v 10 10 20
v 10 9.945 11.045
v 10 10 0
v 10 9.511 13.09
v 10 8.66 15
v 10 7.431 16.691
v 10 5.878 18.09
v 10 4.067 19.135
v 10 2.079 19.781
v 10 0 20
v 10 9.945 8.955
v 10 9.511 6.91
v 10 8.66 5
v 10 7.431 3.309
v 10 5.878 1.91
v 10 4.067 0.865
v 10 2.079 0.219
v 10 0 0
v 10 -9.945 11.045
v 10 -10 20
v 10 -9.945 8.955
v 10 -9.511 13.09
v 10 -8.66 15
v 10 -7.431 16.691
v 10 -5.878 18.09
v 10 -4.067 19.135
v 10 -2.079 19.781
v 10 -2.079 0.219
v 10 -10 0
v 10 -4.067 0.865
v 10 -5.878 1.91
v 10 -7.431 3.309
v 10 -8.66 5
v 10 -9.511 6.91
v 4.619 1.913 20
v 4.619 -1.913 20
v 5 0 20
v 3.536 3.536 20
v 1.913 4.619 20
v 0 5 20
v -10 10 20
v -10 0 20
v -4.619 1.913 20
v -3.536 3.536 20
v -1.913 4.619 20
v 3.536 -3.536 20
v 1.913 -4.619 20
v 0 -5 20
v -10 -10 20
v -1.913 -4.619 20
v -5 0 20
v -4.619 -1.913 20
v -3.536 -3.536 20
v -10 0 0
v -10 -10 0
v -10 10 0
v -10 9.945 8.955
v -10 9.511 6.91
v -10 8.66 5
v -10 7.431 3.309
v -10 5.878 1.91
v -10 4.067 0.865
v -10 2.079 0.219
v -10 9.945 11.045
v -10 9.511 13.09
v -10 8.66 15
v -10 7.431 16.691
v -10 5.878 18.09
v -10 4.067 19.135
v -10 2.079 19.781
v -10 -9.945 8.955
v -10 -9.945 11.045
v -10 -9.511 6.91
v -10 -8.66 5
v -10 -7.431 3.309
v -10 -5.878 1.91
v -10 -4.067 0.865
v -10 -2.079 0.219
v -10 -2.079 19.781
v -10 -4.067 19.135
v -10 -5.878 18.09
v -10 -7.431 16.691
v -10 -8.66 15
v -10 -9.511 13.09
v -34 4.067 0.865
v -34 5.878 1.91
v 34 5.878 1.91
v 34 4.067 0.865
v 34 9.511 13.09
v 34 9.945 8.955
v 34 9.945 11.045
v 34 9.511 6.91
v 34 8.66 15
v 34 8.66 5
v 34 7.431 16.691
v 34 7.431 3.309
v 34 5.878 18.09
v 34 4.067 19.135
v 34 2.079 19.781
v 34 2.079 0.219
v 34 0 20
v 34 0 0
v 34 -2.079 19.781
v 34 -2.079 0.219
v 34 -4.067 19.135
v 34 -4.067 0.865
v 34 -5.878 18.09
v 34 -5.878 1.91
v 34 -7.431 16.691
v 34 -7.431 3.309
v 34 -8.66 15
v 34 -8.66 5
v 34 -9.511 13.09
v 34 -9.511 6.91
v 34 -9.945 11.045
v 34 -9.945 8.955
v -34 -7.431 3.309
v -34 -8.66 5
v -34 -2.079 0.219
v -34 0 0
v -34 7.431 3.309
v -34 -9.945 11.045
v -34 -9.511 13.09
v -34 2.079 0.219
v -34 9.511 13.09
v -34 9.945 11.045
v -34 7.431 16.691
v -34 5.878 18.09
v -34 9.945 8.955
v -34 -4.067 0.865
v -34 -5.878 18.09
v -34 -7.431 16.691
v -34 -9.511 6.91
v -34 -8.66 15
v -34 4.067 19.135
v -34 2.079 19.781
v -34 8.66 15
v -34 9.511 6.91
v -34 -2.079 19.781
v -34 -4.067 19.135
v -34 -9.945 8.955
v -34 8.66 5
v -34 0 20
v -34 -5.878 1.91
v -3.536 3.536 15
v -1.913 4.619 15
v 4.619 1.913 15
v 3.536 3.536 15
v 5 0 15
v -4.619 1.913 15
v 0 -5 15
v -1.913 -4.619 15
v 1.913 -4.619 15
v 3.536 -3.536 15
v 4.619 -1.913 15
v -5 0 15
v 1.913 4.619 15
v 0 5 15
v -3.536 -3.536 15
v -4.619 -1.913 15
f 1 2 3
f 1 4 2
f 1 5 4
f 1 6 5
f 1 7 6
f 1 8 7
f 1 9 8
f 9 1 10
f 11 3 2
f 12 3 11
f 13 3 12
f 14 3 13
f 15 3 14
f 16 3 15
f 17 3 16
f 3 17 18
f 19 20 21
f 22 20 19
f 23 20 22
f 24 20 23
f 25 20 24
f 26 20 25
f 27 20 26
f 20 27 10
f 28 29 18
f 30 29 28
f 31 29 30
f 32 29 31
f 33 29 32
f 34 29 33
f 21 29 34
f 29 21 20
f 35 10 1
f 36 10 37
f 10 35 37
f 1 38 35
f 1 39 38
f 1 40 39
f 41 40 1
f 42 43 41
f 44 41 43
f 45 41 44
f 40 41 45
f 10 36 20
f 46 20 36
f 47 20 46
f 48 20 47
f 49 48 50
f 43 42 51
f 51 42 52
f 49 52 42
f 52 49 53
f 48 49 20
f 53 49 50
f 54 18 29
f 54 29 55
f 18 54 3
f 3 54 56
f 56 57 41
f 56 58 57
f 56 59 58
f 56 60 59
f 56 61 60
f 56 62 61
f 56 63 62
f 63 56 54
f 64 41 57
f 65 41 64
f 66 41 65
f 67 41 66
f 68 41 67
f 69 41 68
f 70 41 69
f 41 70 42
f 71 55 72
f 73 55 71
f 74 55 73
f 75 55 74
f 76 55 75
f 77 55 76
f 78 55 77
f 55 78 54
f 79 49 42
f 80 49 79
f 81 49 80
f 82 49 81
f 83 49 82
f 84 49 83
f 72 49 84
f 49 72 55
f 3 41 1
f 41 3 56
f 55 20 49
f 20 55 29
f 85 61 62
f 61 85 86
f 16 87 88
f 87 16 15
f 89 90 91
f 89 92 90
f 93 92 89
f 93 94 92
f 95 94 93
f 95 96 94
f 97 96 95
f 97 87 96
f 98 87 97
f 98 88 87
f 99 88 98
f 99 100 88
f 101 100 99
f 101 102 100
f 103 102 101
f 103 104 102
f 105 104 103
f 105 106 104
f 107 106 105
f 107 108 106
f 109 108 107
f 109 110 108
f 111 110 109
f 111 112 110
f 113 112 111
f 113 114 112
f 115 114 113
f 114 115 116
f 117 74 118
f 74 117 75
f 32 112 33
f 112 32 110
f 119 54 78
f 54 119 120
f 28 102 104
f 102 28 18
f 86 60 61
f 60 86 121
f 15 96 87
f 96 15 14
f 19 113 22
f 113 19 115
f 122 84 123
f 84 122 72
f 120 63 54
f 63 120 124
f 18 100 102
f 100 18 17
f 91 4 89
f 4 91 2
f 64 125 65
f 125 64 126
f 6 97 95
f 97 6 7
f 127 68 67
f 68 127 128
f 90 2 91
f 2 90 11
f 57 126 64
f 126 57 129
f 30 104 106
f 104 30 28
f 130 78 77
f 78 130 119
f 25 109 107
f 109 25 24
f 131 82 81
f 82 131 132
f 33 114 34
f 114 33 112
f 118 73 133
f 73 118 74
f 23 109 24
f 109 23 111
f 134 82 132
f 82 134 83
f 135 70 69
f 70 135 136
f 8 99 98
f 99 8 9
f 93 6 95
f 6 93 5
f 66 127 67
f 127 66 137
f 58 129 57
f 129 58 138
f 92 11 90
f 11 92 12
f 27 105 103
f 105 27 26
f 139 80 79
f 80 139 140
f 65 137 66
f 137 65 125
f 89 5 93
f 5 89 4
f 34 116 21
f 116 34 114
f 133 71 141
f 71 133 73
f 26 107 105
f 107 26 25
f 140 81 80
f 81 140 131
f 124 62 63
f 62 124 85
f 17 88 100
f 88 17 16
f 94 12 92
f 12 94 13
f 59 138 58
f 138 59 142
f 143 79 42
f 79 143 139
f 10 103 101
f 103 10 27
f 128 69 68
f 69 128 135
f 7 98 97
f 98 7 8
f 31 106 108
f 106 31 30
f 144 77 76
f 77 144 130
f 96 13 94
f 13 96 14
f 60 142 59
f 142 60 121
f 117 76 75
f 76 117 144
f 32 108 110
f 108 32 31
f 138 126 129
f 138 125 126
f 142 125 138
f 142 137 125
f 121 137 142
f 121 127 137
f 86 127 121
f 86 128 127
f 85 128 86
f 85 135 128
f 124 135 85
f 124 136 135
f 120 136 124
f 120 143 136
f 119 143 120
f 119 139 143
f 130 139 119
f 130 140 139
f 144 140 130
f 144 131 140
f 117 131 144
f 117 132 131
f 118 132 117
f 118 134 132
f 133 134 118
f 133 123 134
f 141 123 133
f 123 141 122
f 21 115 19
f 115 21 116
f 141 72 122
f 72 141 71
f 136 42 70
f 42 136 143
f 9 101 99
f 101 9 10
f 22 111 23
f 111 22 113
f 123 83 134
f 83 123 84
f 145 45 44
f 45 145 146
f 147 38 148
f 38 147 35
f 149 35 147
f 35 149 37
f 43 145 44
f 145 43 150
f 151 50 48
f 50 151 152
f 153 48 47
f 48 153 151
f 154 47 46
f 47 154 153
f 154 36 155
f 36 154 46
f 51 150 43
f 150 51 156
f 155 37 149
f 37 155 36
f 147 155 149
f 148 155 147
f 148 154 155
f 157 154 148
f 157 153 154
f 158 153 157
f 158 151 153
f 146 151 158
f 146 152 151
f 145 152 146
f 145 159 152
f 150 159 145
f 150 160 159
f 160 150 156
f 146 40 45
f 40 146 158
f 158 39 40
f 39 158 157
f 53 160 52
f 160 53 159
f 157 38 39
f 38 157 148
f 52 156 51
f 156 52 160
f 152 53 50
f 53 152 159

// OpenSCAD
cube_size = 20; // [10:Small,20:Medium,30:Large]

hole_diameter = 10; 
hole_radius = hole_diameter/2;

// How deep should the center hole be?
hole_depth = 5; // [0,1,5,50]

show_wheels = "yes"; // [yes,no]

// How thick should the side wheels be?
wheel_thickness = 24; // [1:40]

// ignore this variable!
// foo=1;

// don't turn functions into params!
function BEZ03(u) = pow((1-u), 3);

// ignore variable values
bing = 3+4;
baz = 3 / hole_depth;

difference() {
  union() {
    translate([0, 0, cube_size/2]) cube([cube_size,cube_size,cube_size], center=true);
    if (show_wheels == "yes") {
      translate([0, 0, cube_size/2]) rotate([0, 90, 0]) {
        cylinder(r=cube_size/2, h=cube_size+(wheel_thickness*2), center=true);
      }
    }
  }
  translate([0, 0, cube_size-hole_depth]) cylinder(r=hole_radius, h=hole_depth);
}
        
